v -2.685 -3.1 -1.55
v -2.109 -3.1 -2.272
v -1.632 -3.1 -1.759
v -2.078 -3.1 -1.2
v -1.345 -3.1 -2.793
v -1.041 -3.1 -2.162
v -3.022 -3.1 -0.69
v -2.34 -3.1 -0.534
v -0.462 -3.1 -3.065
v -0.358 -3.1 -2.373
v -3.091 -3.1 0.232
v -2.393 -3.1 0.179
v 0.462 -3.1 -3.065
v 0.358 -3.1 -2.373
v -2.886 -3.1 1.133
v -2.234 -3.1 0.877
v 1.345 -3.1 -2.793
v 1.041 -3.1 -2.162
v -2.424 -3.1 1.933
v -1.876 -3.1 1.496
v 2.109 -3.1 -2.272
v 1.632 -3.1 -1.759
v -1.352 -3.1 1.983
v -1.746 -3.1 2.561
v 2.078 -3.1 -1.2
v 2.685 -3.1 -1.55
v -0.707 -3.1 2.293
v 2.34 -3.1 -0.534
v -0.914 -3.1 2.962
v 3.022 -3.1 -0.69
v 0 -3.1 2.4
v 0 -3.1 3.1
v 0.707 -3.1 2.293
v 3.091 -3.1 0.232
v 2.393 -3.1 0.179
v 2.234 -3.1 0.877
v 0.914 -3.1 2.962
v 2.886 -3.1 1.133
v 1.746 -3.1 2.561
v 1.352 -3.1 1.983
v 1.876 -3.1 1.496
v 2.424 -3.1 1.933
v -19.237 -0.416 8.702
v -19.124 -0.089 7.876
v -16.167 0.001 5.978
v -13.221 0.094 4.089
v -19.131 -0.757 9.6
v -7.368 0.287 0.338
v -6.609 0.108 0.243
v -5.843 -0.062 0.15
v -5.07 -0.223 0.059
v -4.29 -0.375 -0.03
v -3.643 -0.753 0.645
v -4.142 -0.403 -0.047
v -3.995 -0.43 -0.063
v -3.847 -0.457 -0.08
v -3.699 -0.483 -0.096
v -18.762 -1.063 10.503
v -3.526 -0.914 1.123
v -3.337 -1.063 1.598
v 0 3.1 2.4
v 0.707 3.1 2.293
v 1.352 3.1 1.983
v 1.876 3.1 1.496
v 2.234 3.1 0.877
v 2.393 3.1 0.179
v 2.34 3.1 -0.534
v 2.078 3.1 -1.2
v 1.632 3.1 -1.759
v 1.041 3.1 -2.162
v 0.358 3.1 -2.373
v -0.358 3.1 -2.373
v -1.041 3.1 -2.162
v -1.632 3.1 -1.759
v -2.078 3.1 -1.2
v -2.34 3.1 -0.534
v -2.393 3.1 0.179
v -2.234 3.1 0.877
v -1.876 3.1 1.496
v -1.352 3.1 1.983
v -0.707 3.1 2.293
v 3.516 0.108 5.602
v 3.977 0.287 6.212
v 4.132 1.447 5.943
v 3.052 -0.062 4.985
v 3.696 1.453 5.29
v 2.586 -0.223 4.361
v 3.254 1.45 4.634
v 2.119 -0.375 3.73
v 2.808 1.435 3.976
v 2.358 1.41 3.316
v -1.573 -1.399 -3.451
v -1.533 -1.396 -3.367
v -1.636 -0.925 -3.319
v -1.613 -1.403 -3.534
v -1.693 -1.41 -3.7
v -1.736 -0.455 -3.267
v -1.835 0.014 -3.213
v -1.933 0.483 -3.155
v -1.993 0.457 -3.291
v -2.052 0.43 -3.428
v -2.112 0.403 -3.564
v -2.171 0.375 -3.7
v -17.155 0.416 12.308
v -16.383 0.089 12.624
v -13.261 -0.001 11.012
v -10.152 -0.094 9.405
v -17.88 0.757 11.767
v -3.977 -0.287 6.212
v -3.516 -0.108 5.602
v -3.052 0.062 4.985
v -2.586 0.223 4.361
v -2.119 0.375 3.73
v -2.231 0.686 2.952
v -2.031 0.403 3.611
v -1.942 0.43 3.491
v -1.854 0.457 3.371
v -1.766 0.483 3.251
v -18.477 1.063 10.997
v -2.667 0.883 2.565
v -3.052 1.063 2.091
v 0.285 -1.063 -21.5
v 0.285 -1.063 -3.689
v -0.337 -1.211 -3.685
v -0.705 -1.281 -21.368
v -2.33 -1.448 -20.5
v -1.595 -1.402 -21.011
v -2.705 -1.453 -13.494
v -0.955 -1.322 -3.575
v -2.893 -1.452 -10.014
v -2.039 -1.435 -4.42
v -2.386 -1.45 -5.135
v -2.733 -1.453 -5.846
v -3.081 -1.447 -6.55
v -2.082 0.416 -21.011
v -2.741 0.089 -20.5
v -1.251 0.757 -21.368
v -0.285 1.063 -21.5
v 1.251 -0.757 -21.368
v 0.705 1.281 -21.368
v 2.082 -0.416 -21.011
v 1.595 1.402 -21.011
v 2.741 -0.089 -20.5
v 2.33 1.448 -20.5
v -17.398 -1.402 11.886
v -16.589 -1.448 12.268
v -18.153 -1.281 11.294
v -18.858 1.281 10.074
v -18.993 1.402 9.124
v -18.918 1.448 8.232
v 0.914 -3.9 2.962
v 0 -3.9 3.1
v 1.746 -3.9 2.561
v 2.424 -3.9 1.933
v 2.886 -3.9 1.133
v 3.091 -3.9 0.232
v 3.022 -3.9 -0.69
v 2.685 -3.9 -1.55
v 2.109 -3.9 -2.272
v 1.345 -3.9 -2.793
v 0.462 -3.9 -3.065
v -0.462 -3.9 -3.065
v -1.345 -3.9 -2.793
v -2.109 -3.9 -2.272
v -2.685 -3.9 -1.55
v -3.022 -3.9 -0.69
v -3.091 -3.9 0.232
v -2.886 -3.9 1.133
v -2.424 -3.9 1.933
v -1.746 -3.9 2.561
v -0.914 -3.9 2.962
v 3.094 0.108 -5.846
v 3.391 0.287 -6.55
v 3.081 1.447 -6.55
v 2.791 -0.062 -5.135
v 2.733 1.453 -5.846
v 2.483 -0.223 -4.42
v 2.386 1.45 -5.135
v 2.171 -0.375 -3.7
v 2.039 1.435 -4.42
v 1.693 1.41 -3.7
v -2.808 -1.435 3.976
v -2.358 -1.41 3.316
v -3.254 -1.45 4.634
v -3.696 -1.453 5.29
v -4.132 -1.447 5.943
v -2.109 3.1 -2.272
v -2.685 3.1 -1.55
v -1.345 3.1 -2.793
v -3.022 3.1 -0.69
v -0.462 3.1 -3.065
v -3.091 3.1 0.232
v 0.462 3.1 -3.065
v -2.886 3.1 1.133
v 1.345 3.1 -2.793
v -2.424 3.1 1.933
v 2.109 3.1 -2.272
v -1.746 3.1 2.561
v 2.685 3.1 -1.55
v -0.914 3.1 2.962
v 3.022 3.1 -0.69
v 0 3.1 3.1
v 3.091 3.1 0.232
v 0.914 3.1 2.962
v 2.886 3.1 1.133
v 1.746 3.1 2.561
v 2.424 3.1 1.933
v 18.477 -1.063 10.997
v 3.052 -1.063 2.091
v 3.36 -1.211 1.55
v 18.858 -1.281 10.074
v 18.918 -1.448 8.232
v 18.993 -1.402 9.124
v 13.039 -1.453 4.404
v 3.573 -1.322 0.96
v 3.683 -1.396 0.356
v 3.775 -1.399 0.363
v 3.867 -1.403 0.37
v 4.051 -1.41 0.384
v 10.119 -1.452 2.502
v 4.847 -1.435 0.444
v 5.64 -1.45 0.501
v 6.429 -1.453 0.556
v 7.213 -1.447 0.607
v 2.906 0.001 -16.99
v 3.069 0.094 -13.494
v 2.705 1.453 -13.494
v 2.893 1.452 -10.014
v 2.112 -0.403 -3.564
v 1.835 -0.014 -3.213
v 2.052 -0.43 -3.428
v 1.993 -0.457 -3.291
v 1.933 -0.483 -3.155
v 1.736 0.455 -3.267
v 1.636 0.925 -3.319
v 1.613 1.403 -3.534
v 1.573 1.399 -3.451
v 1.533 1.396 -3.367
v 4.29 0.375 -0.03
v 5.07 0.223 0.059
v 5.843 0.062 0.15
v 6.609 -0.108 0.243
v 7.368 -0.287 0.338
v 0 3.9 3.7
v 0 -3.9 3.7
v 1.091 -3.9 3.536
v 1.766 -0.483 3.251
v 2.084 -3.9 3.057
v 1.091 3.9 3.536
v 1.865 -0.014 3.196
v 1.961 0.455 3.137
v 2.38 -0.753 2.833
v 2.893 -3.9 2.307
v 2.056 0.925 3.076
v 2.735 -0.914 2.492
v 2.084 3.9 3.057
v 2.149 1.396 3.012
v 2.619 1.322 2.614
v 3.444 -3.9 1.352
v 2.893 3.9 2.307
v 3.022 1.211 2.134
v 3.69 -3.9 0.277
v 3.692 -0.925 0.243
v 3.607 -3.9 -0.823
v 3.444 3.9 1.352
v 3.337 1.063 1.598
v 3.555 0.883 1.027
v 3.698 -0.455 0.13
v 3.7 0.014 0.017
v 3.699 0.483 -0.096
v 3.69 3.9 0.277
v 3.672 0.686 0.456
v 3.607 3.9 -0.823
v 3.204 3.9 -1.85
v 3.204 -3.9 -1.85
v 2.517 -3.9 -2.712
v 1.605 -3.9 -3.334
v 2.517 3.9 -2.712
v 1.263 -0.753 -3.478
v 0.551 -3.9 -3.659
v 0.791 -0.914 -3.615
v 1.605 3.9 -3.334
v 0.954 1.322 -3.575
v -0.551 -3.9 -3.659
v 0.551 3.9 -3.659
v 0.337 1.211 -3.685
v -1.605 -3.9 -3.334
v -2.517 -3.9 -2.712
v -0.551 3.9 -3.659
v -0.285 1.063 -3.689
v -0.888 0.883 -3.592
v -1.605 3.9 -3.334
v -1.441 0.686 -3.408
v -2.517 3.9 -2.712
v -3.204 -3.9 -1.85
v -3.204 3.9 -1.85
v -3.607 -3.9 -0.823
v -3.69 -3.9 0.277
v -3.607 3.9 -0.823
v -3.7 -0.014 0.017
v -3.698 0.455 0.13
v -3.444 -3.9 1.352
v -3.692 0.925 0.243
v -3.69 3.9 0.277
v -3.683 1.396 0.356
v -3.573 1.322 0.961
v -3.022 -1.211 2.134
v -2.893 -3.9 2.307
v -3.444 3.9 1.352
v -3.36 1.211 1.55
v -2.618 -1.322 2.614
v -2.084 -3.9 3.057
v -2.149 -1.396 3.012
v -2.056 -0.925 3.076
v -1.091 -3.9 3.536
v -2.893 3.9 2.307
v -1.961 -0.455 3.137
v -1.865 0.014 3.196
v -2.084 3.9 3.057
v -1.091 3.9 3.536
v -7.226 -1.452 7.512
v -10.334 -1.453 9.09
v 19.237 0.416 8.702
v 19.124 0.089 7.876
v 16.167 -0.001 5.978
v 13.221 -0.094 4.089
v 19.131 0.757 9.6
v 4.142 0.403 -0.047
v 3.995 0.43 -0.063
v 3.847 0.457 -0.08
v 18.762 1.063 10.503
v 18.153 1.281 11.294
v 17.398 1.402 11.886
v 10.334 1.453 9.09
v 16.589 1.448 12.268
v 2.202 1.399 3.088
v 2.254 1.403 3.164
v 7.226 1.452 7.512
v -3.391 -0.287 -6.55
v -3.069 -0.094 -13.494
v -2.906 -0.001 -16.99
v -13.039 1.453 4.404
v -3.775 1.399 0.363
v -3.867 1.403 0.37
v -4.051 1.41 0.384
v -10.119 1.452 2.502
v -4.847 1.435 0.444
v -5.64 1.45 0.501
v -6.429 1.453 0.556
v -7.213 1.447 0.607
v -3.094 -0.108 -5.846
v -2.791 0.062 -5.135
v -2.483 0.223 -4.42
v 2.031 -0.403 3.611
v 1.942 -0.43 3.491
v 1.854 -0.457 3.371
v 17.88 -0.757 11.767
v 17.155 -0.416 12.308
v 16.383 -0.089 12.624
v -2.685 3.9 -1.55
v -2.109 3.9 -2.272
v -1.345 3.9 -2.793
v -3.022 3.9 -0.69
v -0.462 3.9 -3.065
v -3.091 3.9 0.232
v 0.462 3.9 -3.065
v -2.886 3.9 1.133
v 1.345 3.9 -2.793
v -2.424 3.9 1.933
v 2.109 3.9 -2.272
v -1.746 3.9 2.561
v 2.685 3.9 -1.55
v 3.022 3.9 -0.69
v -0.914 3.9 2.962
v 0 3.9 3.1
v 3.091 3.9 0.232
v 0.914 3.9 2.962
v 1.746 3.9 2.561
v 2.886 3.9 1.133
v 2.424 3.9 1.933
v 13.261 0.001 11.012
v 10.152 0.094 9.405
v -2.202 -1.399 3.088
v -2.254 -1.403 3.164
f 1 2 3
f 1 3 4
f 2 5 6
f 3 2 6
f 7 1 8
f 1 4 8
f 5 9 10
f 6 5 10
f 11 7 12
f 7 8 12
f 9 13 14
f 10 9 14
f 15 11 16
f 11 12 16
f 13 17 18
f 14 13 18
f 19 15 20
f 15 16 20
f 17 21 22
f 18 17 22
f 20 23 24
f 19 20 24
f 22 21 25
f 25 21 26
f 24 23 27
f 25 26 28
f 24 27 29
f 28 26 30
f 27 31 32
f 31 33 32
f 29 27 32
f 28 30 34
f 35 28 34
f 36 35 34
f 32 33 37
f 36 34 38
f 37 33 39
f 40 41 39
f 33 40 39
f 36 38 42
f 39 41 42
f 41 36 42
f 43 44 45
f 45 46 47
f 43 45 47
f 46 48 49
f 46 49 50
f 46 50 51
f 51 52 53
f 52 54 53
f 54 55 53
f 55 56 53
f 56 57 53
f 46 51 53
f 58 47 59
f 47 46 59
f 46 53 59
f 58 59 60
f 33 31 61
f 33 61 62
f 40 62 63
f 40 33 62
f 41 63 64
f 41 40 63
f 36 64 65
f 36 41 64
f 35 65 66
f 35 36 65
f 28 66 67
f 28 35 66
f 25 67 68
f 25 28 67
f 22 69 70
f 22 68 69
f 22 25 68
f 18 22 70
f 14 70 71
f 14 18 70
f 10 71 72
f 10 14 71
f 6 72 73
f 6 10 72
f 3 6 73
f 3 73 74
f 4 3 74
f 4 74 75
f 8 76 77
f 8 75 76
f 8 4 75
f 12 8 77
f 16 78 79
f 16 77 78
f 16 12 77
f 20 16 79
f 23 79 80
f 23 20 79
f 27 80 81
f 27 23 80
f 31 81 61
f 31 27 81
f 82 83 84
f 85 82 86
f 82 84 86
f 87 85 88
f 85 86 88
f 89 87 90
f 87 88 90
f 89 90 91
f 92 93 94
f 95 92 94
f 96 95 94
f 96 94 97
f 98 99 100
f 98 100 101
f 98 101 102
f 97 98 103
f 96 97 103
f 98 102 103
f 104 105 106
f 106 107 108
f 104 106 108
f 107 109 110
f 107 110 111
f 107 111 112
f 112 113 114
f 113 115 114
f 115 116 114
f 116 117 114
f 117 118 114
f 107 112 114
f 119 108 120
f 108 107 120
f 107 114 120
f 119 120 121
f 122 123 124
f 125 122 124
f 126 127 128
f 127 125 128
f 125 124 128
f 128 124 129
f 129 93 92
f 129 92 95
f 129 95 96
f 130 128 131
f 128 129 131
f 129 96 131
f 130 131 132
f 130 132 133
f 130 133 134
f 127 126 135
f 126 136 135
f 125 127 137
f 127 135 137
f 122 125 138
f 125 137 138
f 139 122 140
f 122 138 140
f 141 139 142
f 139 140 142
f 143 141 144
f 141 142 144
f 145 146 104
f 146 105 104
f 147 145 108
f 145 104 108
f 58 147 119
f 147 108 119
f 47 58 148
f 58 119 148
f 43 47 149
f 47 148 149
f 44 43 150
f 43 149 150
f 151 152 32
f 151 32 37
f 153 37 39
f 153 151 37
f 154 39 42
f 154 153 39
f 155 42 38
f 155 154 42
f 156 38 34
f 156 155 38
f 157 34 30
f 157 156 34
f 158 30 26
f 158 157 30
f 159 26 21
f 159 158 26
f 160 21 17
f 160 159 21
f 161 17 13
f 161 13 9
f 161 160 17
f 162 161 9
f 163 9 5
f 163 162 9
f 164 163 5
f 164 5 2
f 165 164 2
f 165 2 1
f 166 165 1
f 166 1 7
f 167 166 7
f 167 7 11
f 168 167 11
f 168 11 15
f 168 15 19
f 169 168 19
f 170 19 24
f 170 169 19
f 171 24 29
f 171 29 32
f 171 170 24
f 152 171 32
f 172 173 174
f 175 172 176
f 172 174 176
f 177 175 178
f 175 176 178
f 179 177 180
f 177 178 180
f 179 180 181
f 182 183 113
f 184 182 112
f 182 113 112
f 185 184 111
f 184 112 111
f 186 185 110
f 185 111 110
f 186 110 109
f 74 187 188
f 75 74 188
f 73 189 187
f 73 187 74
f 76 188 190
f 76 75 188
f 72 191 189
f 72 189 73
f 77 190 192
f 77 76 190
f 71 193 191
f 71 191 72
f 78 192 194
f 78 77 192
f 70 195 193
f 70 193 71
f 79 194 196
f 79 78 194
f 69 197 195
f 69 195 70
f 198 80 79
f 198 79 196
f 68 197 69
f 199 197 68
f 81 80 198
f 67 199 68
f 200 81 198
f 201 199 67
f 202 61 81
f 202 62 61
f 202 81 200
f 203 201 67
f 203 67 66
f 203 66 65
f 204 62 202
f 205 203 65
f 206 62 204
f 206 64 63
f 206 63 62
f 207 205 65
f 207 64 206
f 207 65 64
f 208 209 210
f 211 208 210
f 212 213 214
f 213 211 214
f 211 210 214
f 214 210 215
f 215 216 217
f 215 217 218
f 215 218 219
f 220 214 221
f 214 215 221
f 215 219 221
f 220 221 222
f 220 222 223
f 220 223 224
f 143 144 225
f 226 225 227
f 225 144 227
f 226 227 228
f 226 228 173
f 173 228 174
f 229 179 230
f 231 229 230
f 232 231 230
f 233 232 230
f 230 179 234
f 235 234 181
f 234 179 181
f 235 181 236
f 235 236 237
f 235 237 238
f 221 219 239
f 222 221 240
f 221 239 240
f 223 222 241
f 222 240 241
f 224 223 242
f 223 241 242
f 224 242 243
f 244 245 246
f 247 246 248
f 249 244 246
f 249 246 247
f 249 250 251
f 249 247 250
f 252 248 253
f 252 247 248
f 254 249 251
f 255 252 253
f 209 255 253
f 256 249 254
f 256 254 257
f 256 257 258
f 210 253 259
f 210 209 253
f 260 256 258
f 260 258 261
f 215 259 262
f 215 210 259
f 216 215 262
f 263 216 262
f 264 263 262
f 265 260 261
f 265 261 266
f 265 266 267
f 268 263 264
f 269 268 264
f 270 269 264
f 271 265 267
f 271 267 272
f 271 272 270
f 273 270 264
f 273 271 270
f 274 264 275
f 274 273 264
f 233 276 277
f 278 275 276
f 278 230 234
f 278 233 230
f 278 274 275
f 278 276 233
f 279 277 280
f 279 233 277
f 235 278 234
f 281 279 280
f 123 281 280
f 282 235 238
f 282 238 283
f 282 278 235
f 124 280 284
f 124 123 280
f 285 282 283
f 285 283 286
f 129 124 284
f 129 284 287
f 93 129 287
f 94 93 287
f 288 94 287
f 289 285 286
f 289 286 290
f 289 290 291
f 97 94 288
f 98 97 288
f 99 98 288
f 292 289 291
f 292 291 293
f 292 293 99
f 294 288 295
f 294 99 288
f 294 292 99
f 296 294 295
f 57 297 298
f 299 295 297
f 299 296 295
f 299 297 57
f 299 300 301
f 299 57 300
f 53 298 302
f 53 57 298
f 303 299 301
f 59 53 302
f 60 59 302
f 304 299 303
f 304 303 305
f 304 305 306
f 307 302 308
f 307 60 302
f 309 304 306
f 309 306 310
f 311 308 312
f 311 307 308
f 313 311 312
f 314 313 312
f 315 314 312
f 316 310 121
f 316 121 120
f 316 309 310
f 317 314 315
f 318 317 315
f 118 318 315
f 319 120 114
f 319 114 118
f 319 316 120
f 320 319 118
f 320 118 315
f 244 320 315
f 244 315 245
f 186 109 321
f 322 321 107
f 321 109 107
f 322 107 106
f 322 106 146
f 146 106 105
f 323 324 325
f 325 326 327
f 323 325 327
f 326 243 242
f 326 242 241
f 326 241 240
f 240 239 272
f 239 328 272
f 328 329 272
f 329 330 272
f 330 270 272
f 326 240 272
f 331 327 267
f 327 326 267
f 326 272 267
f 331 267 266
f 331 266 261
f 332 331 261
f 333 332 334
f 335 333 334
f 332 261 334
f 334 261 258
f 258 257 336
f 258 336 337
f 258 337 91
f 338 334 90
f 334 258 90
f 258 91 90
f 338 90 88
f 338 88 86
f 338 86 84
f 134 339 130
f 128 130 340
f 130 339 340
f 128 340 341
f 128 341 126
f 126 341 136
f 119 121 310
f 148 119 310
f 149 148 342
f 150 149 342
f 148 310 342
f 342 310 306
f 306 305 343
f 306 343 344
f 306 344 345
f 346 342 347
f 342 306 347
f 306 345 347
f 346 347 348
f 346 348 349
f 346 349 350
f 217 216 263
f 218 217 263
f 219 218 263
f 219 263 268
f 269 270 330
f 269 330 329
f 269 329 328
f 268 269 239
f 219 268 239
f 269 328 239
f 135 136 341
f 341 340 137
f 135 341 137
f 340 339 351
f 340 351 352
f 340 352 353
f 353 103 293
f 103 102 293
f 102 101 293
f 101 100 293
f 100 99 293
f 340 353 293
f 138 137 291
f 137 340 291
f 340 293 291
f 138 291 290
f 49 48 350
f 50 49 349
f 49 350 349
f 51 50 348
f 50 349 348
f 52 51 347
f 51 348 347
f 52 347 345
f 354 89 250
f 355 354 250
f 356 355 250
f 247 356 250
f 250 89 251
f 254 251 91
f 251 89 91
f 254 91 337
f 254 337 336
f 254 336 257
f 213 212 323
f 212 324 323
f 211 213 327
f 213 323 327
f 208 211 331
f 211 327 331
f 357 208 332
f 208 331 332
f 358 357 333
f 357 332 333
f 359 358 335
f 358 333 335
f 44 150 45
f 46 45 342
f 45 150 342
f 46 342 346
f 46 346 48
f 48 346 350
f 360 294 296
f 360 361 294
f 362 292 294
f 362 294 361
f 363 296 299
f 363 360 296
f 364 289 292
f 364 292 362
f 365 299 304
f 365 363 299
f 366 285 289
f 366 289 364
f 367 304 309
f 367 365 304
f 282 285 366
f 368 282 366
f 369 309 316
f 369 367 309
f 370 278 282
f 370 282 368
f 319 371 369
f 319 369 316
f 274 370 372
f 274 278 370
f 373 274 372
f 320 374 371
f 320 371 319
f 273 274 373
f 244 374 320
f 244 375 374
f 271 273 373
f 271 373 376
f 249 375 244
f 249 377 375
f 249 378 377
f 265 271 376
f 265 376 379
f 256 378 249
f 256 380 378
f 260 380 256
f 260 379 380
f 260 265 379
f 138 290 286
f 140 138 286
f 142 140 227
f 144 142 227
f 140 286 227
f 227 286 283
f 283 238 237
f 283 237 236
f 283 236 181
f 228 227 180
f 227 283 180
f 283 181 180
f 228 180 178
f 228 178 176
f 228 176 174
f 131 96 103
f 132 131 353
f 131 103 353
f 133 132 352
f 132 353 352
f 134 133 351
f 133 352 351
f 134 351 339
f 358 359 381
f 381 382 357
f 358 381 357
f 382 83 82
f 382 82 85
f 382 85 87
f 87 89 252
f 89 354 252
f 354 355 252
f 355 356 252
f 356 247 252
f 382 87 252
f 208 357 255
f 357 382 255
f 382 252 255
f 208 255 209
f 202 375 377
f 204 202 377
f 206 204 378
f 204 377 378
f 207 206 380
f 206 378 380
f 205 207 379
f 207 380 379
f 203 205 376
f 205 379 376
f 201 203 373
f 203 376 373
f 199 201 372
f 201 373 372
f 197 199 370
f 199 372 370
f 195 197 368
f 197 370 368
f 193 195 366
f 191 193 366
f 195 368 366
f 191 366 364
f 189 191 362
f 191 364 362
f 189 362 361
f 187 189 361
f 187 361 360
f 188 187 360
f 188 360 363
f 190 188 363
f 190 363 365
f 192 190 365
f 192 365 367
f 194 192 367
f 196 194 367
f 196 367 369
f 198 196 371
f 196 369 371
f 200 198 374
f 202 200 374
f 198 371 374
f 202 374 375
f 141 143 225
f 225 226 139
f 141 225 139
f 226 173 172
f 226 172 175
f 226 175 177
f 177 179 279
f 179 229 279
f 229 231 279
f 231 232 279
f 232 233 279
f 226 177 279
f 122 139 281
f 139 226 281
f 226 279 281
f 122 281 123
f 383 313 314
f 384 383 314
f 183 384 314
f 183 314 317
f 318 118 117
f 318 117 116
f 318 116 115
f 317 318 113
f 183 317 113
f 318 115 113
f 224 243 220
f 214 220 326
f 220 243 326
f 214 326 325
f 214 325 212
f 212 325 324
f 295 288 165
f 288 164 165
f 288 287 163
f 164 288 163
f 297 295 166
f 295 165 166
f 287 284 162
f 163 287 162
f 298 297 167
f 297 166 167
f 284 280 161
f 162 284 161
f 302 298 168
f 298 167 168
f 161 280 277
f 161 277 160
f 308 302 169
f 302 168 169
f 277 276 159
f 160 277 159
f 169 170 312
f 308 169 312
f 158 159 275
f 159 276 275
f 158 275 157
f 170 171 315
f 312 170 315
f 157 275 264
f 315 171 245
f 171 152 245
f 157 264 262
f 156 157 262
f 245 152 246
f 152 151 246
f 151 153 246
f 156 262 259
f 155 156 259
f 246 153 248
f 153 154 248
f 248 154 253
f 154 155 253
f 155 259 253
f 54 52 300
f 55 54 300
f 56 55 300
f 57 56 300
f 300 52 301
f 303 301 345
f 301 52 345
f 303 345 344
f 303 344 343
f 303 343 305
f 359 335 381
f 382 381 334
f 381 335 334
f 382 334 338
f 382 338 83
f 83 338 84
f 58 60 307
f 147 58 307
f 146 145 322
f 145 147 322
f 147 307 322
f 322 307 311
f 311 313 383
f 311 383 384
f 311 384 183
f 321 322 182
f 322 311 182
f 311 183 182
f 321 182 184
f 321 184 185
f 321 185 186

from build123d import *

# Parameters (mm, degrees)
SKETCH1_R             = 3.7
SKETCH1_R_2           = 2.4
HUB_DEPTH             = 3.9
SKETCH2_R             = 3.1
RIM_CUT_DEPTH         = 0.8
BLADE_DEPTH           = 1.1
BLADE_CURVE_DEPTH     = 23.16190425
BODY_MOVE_COPY1_ANGLE = 15
CIRPATTERN1_COUNT     = 3


with BuildPart() as part:
    # Sketch1 → Hub (new, symmetric)
    with BuildSketch(Plane(origin=(0, 0, 0), x_dir=(1, 0, 0), z_dir=(0, 1, 0))):
        Circle(SKETCH1_R)
        Circle(SKETCH1_R_2, mode=Mode.SUBTRACT)
    extrude(amount=HUB_DEPTH, both=True)

    # Sketch2 → Rim Cut (cut)
    with BuildSketch(Plane(origin=(0, 3.9, 0), x_dir=(1, 0, 0), z_dir=(0, 1, 0))):
        Circle(SKETCH2_R)
    rim_cut = extrude(amount=-RIM_CUT_DEPTH, mode=Mode.SUBTRACT)

    # Mirror1: Rim Cut across plane
    add(rim_cut.mirror(Plane.ZX), mode=Mode.SUBTRACT)


with BuildPart() as body_2:
    # Sketch3 → Blade (new, symmetric)
    with BuildSketch(Plane(origin=(0, 0, 0), x_dir=(1, 0, 0), z_dir=(0, 1, 0))):
        with BuildLine():
            Line((-2, 3.7), (-3.35, 6.55))
            Line((-3.35, 6.55), (-2.625, 20.5))
            ThreePointArc((-2.625, 20.5), (0, 21.5), (2.625, 20.5))
            Line((2.625, 20.5), (3.35, 6.55))
            Line((3.35, 6.55), (2, 3.7))
            Line((2, 3.7), (1.526315789, 2.7))
            Line((1.526315789, 2.7), (-1.526315789, 2.7))
            Line((-1.526315789, 2.7), (-2, 3.7))
        make_face()
    extrude(amount=BLADE_DEPTH, both=True)

    # Sketch4 → Blade Curve (cut, through all)
    with BuildSketch(Plane.XY):
        with BuildLine():
            Line((3.35, 0.6), (3.35, 1.1))
            Line((3.35, 1.1), (0, 1.1))
            ThreePointArc((0, 1.1), (1.693553955, 0.974311501), (3.35, 0.6))
        make_face()
        with BuildLine():
            ThreePointArc((-3.35, 0.6), (-1.693553955, 0.974311501), (0, 1.1))
            Line((0, 1.1), (-3.35, 1.1))
            Line((-3.35, 1.1), (-3.35, 0.6))
        make_face()
        with BuildLine():
            ThreePointArc((0, -1.1), (-1.693553955, -0.974311501), (-3.35, -0.6))
            Line((-3.35, -0.6), (-3.35, -1.1))
            Line((-3.35, -1.1), (0, -1.1))
        make_face()
        with BuildLine():
            ThreePointArc((3.35, -0.6), (1.693553955, -0.974311501), (0, -1.1))
            Line((0, -1.1), (3.35, -1.1))
            Line((3.35, -1.1), (3.35, -0.6))
        make_face()
    extrude(amount=-BLADE_CURVE_DEPTH, mode=Mode.SUBTRACT)


with BuildPart() as body_2_1:
    # Body-Move/Copy1: moved
    add(body_2.part.rotate(Axis((0, 0, 0), (0, 0, 1)), BODY_MOVE_COPY1_ANGLE))


with BuildPart() as cirpattern1_1:
    # CirPattern1: pattern copy
    add(body_2_1.part.rotate(Axis((0, 3.9, 0), (0, -1, 0)), 1 * 360 / CIRPATTERN1_COUNT))


with BuildPart() as cirpattern1_2:
    # CirPattern1: pattern copy
    add(body_2_1.part.rotate(Axis((0, 3.9, 0), (0, -1, 0)), 2 * 360 / CIRPATTERN1_COUNT))

    # Combine1: union part, body 2, CirPattern1_1
    add(part.part)
    add(body_2_1.part)
    add(cirpattern1_1.part)


solid = cirpattern1_2.part
